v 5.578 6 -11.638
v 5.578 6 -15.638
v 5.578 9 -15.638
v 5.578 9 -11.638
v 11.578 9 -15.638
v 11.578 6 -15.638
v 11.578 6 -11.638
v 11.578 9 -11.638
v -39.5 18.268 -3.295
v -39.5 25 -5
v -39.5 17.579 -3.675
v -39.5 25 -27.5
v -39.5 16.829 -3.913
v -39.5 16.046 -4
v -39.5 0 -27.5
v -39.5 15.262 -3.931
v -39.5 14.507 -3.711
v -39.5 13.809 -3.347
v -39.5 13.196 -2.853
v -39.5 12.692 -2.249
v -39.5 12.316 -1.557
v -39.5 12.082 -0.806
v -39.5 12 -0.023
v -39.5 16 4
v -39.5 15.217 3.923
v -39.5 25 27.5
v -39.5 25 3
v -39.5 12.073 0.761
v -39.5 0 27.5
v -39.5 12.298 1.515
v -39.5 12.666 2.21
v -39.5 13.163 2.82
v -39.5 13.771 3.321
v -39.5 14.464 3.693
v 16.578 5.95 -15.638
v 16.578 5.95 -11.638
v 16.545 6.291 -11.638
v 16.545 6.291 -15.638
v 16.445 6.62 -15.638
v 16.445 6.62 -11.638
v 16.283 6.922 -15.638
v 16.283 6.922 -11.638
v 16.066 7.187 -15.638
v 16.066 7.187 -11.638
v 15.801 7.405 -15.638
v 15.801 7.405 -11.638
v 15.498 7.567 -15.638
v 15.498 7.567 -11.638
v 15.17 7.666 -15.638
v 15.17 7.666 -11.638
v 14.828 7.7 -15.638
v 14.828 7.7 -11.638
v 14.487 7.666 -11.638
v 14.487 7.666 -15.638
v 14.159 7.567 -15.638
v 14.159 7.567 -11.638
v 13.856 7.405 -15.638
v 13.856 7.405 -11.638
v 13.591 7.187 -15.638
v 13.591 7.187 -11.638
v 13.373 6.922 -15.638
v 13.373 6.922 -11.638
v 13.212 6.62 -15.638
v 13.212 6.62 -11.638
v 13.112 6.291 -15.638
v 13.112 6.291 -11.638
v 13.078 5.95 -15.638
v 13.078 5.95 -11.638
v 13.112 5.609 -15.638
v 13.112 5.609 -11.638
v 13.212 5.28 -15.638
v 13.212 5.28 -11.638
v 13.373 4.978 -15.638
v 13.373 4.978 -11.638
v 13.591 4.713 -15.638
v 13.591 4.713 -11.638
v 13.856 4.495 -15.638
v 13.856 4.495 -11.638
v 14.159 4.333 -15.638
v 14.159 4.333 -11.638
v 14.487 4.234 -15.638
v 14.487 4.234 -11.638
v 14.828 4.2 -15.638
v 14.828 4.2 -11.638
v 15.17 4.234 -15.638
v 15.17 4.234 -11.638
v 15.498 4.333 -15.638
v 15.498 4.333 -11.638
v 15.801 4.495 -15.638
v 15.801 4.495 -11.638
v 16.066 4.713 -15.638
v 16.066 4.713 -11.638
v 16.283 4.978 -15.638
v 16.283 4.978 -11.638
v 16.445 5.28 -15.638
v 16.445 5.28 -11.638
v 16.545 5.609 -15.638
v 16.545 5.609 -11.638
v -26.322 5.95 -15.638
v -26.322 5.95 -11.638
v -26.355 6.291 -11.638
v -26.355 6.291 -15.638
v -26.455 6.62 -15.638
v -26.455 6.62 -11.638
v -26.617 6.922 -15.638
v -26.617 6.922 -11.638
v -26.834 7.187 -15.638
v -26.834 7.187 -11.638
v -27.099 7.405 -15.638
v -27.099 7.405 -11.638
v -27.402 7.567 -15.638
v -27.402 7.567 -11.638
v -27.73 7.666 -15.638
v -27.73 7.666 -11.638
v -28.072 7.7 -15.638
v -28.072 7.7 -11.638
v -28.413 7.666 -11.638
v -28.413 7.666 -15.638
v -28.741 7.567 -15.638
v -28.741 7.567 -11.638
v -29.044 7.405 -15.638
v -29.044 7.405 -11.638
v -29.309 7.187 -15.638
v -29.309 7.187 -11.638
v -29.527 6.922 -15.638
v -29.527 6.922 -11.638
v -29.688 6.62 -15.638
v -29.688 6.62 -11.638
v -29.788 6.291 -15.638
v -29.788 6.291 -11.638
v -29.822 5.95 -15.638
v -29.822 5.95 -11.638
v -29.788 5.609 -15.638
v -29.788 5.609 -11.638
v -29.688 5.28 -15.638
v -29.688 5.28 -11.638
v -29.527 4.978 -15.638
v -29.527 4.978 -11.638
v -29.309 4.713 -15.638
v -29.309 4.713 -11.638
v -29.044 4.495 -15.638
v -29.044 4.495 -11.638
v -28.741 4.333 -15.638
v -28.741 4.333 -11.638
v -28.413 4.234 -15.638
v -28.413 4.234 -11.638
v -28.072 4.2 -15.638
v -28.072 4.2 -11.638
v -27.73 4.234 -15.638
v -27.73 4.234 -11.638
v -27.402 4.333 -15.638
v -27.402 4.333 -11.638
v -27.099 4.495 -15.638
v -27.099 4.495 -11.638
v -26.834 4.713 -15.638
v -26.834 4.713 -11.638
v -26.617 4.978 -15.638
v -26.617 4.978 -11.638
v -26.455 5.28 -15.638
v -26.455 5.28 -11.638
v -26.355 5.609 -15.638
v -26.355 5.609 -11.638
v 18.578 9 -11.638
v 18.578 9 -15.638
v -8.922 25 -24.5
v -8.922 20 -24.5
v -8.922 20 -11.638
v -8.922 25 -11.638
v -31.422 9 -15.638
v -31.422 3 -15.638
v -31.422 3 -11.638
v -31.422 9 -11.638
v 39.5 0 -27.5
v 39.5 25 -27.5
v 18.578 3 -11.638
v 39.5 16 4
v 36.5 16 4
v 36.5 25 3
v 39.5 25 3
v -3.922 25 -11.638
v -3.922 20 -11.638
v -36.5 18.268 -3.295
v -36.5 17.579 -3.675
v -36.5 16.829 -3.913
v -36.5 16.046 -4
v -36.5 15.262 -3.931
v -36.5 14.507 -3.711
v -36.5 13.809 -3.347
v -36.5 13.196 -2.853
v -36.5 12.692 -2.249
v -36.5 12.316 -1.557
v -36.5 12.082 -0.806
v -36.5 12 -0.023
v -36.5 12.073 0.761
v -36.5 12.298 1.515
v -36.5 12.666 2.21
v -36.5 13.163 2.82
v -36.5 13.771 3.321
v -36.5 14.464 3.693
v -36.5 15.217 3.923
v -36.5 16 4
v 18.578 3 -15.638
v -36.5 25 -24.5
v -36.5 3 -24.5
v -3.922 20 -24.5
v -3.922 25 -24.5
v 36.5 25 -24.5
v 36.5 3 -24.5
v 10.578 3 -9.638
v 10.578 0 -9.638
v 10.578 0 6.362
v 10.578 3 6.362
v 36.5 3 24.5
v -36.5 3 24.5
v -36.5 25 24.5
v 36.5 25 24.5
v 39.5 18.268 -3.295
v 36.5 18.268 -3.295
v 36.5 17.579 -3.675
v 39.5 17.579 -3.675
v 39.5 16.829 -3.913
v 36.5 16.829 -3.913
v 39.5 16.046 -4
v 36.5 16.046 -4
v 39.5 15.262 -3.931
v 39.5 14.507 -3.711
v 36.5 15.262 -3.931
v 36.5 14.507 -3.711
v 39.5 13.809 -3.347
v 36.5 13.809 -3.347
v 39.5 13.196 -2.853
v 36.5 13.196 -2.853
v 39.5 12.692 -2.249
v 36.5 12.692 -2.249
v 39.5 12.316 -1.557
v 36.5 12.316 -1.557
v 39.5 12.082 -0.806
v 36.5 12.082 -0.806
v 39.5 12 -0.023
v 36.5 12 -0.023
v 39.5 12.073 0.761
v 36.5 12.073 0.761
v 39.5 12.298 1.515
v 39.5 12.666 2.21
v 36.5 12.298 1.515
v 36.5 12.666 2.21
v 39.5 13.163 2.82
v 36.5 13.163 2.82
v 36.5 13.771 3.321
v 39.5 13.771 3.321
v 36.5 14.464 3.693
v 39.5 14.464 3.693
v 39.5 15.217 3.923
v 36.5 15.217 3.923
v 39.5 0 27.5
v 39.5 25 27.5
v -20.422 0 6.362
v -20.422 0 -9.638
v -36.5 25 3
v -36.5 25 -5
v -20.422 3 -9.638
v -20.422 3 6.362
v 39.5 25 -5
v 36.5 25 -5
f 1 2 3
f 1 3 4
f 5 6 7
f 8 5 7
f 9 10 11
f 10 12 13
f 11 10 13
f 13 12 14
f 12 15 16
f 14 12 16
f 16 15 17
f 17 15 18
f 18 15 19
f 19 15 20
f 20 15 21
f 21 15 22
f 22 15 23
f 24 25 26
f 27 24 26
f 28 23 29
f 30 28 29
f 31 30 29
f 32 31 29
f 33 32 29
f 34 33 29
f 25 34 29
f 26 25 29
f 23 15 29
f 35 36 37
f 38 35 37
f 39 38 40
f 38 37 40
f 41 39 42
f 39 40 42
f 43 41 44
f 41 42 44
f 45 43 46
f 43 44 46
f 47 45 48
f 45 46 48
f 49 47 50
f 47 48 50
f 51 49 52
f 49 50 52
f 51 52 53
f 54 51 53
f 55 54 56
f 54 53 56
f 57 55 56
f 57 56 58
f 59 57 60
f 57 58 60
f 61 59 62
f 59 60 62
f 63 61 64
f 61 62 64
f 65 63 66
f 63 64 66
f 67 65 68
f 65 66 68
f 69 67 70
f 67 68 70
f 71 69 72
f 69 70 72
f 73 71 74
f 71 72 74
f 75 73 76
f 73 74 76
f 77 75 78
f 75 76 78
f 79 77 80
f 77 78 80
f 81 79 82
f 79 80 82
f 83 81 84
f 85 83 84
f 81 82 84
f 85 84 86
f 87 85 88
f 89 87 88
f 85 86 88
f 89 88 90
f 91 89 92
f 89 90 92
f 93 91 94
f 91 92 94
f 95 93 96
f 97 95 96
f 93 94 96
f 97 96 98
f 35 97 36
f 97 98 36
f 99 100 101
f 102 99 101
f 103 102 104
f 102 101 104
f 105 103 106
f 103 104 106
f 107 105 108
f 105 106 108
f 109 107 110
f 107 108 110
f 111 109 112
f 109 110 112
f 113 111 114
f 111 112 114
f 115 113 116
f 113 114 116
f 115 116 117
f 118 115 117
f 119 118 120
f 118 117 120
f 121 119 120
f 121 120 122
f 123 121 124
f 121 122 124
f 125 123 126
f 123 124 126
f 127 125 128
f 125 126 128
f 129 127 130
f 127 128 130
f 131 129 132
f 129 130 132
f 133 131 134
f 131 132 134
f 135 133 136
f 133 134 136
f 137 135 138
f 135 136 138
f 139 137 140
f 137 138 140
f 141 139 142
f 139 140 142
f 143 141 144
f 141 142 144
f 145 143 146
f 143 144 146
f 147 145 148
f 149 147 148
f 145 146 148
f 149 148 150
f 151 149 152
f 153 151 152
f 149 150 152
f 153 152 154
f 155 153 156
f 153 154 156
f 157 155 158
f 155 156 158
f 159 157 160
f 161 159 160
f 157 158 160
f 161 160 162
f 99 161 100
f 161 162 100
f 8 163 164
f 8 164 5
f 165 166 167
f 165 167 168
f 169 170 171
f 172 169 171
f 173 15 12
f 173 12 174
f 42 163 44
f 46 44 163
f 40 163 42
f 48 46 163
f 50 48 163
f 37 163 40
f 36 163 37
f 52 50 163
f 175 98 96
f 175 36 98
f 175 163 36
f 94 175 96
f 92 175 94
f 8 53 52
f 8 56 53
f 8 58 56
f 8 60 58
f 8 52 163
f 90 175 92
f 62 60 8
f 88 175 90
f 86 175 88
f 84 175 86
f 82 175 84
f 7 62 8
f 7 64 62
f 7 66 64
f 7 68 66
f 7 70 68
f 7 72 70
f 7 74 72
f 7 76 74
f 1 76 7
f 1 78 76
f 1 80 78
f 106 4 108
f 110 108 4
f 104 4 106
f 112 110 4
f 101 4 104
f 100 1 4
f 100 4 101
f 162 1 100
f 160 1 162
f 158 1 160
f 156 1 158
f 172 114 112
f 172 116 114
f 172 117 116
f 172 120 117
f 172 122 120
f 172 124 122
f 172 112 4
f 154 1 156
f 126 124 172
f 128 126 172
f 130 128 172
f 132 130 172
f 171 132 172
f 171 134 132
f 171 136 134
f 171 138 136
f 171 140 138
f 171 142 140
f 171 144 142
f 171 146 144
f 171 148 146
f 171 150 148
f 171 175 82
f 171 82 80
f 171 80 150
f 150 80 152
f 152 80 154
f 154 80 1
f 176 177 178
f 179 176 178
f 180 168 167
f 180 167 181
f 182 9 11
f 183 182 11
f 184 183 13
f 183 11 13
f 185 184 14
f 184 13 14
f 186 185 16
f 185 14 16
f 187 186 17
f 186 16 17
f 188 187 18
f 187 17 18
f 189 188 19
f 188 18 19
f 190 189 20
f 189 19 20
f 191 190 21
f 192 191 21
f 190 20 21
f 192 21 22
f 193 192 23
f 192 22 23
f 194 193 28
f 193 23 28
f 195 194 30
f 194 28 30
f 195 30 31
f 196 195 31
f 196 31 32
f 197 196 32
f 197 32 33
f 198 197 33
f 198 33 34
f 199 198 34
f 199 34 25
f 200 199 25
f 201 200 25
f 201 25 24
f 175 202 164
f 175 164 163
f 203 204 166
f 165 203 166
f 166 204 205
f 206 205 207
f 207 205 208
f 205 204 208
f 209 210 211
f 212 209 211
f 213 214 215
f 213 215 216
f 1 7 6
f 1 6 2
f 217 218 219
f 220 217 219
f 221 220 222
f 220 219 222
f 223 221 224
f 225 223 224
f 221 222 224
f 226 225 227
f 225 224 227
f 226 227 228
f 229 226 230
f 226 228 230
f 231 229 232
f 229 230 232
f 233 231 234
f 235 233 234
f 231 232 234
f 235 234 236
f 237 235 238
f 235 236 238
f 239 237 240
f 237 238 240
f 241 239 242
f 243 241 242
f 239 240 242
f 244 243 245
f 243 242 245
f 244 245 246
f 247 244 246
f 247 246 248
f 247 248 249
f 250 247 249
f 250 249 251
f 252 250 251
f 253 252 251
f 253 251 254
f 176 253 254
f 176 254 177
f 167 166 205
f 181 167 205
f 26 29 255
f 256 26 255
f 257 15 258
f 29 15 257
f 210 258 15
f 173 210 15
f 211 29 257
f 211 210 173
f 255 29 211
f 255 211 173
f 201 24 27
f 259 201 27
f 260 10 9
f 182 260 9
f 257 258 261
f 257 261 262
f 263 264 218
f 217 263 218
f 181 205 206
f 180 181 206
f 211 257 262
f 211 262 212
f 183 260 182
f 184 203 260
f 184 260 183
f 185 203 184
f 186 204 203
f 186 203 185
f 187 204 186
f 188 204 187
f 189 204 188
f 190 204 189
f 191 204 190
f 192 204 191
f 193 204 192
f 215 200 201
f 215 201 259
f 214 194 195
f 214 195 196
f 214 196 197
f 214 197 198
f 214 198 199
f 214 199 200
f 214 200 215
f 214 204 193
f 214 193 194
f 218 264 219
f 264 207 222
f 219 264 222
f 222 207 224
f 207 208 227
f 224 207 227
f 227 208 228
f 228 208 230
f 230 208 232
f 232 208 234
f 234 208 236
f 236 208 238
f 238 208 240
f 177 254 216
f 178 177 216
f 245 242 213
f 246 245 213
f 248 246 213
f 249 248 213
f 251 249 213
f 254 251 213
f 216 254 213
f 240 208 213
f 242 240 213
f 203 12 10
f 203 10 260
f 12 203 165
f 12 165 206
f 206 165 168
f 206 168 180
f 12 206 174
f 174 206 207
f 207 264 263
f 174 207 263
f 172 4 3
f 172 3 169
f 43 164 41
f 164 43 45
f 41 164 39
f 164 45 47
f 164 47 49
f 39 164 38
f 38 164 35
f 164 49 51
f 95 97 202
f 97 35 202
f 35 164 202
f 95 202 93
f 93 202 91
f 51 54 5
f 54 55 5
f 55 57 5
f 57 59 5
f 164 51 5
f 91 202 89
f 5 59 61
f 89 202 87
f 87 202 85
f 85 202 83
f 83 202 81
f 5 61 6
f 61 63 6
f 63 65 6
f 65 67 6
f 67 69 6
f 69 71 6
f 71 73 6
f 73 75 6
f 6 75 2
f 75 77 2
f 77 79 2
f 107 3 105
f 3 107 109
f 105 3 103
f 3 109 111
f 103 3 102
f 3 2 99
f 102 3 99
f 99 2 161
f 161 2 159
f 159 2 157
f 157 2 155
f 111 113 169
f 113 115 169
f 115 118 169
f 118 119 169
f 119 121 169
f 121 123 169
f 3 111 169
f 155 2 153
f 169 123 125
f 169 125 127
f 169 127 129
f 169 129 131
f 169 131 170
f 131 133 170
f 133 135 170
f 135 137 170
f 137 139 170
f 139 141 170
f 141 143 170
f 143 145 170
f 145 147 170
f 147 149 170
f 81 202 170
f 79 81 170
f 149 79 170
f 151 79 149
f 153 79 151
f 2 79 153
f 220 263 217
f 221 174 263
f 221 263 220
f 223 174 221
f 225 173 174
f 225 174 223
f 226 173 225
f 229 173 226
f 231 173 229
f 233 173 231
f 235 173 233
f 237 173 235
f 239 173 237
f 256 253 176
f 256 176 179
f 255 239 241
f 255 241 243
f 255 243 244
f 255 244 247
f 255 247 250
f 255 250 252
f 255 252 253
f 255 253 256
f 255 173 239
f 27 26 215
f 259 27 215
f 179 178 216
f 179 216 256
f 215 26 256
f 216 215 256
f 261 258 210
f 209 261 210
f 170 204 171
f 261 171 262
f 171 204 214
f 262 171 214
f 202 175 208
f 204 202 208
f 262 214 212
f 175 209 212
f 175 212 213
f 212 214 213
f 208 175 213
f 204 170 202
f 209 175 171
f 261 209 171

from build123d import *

# Parameters (mm, degrees)
F0_W      = 79
F0_H      = 55
F0_W_2    = 73
F0_H_2    = 49
F1_DEPTH  = 25
F3_DEPTH  = 79
F0_W_3    = 31
F0_H_3    = 16
F4_DEPTH  = 3
F5_W      = 6
F5_H      = 4
F6_DEPTH  = 3
F5_W_2    = 37
F5_W_3    = 7
F7_DEPTH  = 6
F8_W      = 5
F8_H      = 5
F9_DEPTH  = 12.86194
F10_R     = 1.75
F11_DEPTH = 4


with BuildPart() as f1:
    # F0 (on Front) → F1 (new body)
    with BuildSketch(Plane.XZ):
        Rectangle(F0_W, F0_H)
        Rectangle(F0_W_2, F0_H_2, mode=Mode.SUBTRACT)
    extrude(amount=-F1_DEPTH)

    # F2 (on face) → F3 (cut, through all)
    with BuildSketch(Plane(origin=(-39.5, 0, 0), x_dir=(0, -1, 0), z_dir=(-1, 0, 0))):
        with BuildLine():
            Line((-25, -5), (-18.267742, -3.295049))
            ThreePointArc((-18.267742, -3.295049), (-12.180301, -1.187393), (-16, 4))
            Line((-16, 4), (-16.878049, 3.902439))
            Line((-16.878049, 3.902439), (-25, 3))
            Line((-25, 3), (-25, -5))
        make_face()
    extrude(amount=-F3_DEPTH, mode=Mode.SUBTRACT)

    # F0 (on Front) → F4 (join)
    with BuildSketch(Plane.XZ):
        Rectangle(F0_W_2, F0_H_2)
        with Locations((-4.921641, -1.63806)):
            Rectangle(F0_W_3, F0_H_3, mode=Mode.SUBTRACT)
    extrude(amount=-F4_DEPTH)

    # F5 (on face) → F6 (join)
    with BuildSketch(Plane(origin=(0, 3, 0), x_dir=(-1, 0, 0), z_dir=(0, 1, 0))):
        with Locations((-8.578359, -13.63806)):
            Rectangle(F5_W, F5_H)
    extrude(amount=F6_DEPTH)

    # F5 (on face) → F7 (join)
    with BuildSketch(Plane(origin=(0, 3, 0), x_dir=(-1, 0, 0), z_dir=(0, 1, 0))):
        with Locations((12.921641, -13.63806)):
            Rectangle(F5_W_2, F5_H)
        with Locations((-15.078359, -13.63806)):
            Rectangle(F5_W_3, F5_H)
    extrude(amount=F7_DEPTH)

    # F8 (on face) → F9 (join)
    with BuildSketch(Plane.XY.offset(-24.5)):
        with Locations((-6.421641, 22.5)):
            Rectangle(F8_W, F8_H)
    extrude(amount=F9_DEPTH)

    # F10 (on face) → F11 (cut, through all)
    with BuildSketch(Plane.XY.offset(-11.63806)):
        with Locations((14.828359, 5.95)):
            Circle(F10_R)
        with Locations((-28.071641, 5.95)):
            Circle(F10_R)
    extrude(amount=-F11_DEPTH, mode=Mode.SUBTRACT)


solid = f1.part
